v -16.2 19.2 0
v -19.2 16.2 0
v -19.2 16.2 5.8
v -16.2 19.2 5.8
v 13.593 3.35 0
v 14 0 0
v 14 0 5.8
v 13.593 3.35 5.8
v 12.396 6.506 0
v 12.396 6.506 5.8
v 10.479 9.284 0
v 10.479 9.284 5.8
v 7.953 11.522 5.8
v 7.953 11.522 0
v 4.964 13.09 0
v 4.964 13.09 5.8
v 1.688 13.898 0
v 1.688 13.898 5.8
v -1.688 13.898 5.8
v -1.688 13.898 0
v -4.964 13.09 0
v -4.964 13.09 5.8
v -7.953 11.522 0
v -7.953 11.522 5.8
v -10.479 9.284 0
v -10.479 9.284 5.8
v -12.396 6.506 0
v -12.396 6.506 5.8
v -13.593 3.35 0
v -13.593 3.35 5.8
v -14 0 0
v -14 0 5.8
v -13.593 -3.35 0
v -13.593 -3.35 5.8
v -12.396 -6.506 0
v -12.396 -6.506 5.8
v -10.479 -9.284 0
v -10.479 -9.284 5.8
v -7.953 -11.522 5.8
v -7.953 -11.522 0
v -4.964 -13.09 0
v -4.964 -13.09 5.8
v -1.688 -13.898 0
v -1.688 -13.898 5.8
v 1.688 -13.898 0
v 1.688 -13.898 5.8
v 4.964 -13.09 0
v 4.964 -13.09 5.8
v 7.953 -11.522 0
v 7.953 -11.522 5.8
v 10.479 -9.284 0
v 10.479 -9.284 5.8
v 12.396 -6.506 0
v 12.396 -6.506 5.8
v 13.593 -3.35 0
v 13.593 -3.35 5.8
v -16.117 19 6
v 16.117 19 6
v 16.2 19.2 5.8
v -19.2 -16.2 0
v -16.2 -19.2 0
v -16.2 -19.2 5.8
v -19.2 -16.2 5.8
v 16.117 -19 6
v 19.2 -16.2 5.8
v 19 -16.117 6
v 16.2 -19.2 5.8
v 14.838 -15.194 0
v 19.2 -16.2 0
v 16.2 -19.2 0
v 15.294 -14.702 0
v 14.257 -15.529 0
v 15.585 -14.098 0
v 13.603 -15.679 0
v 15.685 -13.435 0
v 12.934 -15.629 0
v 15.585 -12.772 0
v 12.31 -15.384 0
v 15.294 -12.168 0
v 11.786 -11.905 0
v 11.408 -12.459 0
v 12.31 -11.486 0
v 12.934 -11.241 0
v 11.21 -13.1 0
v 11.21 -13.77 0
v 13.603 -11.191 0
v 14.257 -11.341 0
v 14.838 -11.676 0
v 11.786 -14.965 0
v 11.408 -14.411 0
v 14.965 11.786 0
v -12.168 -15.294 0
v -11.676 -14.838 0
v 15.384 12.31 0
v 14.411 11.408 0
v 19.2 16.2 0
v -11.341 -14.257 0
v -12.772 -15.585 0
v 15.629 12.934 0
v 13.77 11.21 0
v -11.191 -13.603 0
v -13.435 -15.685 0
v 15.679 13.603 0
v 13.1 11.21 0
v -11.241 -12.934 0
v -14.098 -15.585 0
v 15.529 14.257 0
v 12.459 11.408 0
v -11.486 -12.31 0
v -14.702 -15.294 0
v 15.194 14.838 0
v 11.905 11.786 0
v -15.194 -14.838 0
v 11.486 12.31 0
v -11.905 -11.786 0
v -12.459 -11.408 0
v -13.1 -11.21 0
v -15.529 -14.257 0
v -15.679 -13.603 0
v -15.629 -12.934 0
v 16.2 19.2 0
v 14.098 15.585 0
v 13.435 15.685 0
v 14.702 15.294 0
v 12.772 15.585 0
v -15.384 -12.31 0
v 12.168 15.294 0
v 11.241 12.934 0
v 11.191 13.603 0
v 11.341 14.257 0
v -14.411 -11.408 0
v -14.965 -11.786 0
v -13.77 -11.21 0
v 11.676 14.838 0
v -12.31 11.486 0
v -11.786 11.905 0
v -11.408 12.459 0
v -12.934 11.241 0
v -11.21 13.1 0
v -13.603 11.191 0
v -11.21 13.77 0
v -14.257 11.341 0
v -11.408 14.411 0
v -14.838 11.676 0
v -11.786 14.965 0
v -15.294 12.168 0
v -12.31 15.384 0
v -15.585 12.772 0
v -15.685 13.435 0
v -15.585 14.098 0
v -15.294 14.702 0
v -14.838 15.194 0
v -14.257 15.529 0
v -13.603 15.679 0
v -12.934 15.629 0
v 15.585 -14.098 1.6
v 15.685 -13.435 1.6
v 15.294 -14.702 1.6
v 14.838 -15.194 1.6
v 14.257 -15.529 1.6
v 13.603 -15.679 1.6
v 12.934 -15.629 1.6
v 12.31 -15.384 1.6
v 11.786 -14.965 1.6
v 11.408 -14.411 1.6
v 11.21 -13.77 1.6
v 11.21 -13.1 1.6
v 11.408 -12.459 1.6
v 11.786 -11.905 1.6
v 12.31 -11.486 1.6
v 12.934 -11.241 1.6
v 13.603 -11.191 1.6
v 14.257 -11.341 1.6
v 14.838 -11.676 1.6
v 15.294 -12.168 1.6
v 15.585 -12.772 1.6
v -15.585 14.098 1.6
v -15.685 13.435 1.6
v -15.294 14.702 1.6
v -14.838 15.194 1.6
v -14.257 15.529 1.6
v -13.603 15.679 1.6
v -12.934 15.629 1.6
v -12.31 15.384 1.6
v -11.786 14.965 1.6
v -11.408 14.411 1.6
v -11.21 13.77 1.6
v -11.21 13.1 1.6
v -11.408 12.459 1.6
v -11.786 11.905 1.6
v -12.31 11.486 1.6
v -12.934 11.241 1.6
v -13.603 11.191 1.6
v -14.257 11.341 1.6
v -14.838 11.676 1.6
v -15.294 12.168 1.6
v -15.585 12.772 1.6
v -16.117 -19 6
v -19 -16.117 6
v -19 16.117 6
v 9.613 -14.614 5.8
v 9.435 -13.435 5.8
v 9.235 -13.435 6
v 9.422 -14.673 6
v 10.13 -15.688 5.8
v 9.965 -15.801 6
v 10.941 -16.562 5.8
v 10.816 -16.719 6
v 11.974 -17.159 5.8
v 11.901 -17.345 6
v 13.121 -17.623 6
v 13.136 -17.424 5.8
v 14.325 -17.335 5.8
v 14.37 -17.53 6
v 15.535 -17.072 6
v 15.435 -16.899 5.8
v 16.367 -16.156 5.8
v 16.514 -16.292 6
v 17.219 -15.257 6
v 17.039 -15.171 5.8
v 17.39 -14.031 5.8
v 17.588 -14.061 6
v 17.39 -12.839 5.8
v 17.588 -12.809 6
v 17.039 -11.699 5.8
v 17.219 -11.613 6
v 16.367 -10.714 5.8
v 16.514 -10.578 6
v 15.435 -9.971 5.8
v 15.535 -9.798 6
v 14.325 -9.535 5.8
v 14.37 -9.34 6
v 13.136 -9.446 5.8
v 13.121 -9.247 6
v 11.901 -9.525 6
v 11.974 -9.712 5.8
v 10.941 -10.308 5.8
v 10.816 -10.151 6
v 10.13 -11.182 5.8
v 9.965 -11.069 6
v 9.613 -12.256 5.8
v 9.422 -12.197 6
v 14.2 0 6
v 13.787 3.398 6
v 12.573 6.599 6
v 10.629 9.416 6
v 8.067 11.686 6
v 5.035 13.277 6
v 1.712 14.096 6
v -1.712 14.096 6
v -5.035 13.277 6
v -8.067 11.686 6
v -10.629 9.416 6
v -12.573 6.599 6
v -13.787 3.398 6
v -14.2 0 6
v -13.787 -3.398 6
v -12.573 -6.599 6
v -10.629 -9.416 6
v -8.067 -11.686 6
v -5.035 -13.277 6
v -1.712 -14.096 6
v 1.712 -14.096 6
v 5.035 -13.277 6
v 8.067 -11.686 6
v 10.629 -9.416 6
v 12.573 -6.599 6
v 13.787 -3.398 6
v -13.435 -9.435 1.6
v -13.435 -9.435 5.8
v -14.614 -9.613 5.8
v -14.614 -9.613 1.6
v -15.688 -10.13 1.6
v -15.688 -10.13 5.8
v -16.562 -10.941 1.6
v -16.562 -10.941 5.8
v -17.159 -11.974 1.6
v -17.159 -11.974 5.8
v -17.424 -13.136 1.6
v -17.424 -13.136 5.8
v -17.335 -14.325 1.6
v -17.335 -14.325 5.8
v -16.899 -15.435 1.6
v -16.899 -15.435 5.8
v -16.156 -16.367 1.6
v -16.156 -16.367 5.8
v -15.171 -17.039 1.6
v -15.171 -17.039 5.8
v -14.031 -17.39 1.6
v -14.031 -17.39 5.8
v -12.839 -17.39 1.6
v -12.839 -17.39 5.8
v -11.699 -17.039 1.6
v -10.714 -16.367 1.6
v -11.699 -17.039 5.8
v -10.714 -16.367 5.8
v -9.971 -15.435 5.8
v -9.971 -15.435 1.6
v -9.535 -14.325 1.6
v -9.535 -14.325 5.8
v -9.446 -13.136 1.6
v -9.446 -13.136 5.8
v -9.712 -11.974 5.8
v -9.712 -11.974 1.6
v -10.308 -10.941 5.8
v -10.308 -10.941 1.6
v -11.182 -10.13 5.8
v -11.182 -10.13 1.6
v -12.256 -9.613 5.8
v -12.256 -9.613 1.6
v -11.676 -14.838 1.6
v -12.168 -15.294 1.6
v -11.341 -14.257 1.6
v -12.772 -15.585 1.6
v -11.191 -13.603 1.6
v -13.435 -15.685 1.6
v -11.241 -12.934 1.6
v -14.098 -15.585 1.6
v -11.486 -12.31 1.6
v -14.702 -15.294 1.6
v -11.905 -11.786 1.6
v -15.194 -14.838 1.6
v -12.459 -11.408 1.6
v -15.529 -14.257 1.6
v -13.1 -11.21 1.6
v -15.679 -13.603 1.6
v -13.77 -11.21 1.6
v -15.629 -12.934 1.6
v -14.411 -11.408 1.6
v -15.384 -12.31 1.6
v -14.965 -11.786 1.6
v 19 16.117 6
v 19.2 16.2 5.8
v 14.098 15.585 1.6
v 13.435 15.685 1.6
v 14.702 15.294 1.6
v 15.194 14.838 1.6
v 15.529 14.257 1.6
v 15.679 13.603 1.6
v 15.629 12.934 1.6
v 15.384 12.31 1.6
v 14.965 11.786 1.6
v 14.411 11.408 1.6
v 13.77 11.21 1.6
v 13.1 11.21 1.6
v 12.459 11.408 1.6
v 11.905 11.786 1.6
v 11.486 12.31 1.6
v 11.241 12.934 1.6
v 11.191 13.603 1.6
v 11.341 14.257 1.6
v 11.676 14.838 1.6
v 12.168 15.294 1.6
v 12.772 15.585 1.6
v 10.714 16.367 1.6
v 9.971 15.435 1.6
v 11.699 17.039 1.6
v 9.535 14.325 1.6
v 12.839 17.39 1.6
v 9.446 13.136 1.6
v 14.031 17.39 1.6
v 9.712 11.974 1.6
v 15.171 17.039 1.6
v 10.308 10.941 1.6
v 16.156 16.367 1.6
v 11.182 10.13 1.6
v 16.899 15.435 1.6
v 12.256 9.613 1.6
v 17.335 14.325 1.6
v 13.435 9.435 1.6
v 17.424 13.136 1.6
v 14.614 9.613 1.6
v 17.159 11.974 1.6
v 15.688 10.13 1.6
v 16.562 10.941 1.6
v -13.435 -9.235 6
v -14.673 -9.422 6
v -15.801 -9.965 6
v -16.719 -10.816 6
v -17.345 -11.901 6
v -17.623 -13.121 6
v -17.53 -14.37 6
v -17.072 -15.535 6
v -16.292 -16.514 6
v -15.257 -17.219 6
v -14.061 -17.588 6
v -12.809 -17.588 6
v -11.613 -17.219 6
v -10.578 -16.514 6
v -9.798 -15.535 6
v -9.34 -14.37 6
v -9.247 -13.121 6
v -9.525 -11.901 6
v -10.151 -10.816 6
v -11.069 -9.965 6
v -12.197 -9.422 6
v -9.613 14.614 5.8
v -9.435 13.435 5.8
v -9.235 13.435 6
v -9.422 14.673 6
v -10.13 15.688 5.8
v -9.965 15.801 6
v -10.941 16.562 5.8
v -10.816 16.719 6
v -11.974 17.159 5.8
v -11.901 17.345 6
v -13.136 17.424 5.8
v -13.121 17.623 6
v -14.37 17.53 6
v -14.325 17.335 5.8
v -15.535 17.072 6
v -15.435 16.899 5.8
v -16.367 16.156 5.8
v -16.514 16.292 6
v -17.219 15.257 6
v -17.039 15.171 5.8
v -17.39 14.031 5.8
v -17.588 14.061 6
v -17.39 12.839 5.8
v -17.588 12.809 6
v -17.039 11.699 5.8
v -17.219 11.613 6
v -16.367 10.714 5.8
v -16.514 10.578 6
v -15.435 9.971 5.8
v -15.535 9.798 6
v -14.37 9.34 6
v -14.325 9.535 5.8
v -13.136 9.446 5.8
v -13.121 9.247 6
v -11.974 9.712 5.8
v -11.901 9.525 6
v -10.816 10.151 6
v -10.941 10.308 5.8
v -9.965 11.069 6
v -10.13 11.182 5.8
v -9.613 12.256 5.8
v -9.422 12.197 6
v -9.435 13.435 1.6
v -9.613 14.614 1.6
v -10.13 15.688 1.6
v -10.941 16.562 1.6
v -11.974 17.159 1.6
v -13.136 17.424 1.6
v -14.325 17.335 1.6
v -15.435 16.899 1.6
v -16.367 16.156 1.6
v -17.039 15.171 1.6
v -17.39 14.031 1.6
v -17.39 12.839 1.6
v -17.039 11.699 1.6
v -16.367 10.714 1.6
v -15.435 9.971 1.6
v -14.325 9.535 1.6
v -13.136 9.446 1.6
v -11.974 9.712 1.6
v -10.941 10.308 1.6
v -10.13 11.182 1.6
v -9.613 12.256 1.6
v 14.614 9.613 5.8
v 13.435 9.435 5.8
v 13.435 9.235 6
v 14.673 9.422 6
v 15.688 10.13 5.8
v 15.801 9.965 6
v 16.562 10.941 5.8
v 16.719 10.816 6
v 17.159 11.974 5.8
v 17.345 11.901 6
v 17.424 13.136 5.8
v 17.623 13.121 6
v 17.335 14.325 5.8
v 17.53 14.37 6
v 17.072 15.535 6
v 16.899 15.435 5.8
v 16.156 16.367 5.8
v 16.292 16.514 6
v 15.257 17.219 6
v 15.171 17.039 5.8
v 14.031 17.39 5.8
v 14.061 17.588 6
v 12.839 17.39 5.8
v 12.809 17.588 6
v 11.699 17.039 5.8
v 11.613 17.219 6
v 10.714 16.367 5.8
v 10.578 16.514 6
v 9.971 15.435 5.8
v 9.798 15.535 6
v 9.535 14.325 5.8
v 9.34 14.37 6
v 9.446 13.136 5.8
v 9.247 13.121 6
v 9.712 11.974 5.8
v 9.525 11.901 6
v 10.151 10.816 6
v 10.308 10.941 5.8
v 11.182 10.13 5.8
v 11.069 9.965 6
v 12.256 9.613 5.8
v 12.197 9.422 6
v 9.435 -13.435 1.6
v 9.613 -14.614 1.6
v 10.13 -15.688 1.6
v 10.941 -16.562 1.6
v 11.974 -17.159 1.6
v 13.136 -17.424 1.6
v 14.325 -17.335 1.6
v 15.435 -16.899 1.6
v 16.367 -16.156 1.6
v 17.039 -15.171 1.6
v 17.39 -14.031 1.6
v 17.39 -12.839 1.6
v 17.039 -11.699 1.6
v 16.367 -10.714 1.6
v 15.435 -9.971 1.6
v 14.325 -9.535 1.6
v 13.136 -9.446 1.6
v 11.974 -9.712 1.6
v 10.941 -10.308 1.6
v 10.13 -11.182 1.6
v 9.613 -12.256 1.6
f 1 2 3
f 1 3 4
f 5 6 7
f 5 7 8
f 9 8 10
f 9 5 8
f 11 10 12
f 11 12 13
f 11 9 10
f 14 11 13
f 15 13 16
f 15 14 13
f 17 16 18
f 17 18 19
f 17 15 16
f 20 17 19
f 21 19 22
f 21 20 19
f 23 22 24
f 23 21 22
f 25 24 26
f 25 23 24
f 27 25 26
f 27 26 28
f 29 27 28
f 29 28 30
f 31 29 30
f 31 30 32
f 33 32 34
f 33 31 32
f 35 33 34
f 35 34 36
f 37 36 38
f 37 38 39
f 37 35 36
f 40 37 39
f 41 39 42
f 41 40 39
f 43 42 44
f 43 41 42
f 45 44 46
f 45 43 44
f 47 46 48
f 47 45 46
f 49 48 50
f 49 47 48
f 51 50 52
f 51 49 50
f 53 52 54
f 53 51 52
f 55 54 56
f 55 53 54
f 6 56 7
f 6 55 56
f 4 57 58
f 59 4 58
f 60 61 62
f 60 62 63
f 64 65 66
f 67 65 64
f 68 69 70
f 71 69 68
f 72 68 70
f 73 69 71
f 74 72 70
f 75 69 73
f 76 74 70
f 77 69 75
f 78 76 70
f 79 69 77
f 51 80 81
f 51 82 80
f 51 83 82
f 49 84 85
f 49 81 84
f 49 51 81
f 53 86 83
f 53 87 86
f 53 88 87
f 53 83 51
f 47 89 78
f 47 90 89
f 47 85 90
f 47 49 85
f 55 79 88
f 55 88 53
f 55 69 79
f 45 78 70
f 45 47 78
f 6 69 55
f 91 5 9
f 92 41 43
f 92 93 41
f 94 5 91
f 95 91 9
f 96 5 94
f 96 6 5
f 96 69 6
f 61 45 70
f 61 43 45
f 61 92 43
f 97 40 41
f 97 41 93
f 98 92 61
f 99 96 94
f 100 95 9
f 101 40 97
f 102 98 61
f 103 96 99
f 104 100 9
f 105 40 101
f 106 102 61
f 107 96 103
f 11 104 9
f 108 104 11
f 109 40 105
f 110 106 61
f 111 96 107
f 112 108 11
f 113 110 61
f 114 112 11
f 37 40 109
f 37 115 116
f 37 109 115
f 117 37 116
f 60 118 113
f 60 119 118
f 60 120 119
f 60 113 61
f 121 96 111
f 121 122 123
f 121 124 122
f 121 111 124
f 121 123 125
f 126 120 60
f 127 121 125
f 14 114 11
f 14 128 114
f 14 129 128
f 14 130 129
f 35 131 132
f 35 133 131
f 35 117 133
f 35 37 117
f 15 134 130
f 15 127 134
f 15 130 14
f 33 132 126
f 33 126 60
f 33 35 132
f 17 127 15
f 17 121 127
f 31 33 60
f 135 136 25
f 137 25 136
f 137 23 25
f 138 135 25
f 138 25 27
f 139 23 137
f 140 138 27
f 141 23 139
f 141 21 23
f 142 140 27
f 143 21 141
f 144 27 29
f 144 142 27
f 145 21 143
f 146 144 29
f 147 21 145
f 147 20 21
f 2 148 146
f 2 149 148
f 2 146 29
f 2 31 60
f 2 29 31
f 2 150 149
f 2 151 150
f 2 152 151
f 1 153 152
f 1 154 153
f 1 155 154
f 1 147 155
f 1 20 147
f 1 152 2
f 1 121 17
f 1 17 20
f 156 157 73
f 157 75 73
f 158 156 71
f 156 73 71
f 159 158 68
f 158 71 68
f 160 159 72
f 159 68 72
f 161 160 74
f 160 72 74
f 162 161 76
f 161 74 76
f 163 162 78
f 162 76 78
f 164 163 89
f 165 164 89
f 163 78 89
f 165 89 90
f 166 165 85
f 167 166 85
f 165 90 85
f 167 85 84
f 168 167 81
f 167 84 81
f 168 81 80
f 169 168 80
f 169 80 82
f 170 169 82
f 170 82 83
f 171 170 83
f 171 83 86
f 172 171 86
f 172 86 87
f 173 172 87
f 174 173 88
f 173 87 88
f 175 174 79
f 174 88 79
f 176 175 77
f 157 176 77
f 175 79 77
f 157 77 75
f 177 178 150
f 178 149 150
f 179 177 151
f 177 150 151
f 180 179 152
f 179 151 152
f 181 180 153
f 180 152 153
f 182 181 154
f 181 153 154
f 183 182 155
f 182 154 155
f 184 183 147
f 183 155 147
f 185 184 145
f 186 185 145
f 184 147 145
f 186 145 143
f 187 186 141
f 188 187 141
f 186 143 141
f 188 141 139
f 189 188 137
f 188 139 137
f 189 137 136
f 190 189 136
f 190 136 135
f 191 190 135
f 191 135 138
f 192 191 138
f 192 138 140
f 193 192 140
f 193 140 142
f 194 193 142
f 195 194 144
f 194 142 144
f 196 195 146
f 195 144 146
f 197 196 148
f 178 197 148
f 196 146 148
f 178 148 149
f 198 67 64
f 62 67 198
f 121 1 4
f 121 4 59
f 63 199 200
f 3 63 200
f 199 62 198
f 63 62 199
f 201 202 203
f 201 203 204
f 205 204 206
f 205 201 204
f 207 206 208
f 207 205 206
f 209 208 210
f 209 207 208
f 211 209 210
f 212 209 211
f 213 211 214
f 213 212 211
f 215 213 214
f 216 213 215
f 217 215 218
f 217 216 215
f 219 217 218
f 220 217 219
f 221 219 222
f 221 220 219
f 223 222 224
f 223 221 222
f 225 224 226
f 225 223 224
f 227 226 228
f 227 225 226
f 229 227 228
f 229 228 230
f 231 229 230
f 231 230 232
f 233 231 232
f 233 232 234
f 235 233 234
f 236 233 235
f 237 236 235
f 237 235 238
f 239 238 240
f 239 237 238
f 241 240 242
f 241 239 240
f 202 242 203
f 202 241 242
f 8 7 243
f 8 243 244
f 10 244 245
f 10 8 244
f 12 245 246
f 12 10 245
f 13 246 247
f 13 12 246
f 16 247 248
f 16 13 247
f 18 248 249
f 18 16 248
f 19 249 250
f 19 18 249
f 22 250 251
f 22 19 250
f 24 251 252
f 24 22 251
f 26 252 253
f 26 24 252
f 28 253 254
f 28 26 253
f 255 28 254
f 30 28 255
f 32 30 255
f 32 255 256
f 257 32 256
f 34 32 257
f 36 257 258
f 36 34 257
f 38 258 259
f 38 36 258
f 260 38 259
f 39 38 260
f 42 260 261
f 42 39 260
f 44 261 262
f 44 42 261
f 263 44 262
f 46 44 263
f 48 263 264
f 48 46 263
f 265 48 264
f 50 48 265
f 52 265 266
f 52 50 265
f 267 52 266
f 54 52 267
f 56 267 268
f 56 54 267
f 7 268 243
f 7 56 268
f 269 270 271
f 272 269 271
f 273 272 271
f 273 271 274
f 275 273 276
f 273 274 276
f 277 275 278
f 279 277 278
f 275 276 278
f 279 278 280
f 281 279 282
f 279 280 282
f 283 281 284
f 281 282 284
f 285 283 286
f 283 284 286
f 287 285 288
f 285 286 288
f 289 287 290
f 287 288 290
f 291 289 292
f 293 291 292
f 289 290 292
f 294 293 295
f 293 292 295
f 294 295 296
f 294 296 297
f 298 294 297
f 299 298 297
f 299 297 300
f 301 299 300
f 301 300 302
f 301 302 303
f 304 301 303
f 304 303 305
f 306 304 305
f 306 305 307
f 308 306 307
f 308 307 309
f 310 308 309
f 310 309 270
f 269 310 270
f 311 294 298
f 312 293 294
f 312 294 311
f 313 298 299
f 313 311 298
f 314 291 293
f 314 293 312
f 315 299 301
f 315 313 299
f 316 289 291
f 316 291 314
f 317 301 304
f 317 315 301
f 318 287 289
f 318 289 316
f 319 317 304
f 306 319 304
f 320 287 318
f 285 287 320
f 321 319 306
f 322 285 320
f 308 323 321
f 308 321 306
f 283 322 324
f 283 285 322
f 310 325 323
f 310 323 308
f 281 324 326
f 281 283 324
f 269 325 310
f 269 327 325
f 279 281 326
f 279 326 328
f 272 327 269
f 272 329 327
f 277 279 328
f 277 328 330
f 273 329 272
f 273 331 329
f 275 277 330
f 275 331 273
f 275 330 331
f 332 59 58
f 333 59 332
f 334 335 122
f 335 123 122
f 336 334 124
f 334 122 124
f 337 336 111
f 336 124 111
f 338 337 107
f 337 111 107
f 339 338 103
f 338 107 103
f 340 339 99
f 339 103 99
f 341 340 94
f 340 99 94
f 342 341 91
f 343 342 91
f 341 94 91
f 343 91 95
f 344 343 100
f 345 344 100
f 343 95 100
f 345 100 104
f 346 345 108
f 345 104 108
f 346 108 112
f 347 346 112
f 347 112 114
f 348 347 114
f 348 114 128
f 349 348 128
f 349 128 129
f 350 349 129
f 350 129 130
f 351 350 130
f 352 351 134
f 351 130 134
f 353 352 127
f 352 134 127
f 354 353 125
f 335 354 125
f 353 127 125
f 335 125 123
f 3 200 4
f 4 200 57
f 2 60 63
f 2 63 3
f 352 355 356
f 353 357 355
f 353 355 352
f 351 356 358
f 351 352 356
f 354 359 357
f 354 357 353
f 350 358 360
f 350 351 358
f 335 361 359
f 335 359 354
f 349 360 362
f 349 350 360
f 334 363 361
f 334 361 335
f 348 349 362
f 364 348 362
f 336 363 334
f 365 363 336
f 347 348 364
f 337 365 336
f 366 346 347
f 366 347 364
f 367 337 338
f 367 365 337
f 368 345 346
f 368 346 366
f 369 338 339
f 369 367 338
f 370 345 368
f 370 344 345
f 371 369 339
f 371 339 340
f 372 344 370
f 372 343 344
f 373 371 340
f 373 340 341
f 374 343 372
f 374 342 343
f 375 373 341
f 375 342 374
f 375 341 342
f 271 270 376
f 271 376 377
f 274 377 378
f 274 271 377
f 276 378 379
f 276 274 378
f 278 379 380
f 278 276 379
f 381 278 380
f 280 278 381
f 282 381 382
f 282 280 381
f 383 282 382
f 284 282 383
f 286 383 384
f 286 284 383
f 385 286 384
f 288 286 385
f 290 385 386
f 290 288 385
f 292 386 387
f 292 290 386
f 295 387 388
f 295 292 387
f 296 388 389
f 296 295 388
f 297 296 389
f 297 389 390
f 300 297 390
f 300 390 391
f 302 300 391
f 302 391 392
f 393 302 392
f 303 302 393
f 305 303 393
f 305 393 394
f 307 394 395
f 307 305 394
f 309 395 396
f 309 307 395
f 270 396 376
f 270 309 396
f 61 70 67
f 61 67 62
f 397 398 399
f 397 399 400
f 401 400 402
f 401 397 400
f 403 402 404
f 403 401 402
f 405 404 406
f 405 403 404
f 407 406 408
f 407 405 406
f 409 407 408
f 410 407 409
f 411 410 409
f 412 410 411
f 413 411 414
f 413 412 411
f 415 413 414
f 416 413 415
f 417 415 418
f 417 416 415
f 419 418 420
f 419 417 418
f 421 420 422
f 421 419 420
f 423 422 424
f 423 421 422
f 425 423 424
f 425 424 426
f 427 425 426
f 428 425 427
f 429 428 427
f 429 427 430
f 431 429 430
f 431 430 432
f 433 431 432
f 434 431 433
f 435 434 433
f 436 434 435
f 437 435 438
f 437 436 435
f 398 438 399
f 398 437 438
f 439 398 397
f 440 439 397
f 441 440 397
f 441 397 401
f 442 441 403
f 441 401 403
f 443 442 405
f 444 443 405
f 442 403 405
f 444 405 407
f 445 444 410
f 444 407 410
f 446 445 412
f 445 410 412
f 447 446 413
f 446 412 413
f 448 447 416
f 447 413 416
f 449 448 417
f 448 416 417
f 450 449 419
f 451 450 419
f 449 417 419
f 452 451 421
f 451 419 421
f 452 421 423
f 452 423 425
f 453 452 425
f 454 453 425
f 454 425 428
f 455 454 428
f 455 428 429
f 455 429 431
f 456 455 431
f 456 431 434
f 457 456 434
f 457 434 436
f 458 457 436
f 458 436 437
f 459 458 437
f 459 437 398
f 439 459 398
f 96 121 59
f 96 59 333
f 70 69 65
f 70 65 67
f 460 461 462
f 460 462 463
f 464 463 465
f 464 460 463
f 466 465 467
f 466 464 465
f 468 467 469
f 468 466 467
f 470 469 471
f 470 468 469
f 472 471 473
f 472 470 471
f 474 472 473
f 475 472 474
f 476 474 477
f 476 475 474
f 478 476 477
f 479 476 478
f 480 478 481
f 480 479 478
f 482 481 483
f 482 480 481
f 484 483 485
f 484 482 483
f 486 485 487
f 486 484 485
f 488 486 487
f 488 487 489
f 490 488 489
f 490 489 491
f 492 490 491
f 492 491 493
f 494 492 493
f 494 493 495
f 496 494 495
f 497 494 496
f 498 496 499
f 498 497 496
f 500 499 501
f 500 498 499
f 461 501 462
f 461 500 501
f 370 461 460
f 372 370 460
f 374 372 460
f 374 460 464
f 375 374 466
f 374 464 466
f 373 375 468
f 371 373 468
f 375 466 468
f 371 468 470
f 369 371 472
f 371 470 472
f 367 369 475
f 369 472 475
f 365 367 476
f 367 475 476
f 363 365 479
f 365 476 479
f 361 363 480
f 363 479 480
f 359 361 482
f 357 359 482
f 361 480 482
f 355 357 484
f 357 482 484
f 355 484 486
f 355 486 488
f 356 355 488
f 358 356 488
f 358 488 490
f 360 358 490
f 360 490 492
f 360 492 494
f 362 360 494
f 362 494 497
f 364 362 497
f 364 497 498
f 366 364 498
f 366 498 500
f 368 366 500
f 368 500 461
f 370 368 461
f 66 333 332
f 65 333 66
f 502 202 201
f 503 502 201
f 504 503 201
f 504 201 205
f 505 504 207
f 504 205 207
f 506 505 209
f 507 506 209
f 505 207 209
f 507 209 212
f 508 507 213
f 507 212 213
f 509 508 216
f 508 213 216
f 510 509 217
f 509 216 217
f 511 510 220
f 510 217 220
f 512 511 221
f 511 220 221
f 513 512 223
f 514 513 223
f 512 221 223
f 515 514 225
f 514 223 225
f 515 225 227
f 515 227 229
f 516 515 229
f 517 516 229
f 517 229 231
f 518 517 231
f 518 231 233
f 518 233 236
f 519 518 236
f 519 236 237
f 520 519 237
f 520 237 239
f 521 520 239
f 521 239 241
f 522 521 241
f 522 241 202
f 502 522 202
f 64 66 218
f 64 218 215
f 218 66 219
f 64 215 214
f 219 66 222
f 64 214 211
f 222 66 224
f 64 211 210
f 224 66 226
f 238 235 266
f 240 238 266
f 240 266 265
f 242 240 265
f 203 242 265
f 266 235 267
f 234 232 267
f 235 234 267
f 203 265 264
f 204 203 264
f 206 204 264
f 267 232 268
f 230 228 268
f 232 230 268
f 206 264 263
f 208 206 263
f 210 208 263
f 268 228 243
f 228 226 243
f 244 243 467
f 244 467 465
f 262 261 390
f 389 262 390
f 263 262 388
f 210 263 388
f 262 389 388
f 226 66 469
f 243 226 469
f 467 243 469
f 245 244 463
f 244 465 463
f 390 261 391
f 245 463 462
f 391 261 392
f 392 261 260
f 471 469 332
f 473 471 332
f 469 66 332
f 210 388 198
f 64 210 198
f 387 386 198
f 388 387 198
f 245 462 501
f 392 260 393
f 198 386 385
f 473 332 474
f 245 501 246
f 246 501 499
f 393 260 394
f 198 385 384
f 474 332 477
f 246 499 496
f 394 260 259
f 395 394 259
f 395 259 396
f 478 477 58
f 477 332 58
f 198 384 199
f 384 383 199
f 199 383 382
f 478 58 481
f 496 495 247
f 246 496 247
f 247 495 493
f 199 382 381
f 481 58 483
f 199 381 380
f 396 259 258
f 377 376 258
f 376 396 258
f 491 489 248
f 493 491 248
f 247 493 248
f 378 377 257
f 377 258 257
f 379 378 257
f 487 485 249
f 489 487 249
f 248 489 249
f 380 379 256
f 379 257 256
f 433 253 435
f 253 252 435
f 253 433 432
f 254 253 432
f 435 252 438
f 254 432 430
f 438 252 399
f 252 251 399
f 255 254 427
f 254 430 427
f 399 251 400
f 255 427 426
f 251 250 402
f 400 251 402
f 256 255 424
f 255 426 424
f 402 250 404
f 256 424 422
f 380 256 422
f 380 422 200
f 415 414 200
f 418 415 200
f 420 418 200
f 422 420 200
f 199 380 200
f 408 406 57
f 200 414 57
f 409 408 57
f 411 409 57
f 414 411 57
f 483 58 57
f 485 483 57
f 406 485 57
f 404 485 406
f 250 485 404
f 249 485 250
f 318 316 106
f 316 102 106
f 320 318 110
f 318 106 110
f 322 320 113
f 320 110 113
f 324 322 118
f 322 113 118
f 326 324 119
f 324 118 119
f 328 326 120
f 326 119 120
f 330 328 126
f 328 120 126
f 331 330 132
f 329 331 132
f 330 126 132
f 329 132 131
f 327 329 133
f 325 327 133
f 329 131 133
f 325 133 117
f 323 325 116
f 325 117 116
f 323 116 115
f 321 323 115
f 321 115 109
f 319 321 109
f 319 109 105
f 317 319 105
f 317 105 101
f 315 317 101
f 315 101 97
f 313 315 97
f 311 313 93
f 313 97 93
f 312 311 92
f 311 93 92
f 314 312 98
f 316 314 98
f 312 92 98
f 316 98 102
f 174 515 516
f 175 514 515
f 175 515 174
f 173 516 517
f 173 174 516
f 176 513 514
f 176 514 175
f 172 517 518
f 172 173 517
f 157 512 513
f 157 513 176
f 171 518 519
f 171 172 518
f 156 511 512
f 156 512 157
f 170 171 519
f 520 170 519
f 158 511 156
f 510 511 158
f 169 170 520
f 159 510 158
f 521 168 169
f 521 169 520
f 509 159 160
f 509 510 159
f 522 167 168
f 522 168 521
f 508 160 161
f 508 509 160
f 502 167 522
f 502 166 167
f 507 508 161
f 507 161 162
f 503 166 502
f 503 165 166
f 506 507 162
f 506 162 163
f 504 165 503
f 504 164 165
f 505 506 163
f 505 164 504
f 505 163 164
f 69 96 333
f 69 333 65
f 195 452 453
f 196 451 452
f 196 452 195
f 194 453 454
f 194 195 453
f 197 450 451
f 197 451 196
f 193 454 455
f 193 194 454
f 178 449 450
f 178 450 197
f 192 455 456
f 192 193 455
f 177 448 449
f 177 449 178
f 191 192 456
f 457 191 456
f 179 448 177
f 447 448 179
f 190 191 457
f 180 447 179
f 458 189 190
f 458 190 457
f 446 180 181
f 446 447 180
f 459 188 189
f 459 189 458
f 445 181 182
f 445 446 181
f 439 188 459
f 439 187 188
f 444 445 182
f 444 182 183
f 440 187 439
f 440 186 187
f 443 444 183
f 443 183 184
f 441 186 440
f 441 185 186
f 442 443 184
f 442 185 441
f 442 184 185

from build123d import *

# Parameters (mm, degrees)
SKETCH_1_R                   = 14
EXTRUDE_1_DEPTH              = 6
HOLE_WIZARD_M4_3_D           = 4.5
HOLE_WIZARD_M4_3_CBORE_D     = 8
HOLE_WIZARD_M4_3_CBORE_DEPTH = 4.4
PATTERN_CIRCULAR_1_COUNT     = 4
CHAMFER_1_SIZE               = 0.2


with BuildPart() as part:
    # 草圖1 → 填料-伸長1 (new body)
    with BuildSketch(Plane.XY):
        Polygon((-19.2, 16.2), (-16.2, 19.2), (16.2, 19.2), (19.2, 16.2), (19.2, -16.2), (16.2, -19.2), (-16.2, -19.2), (-19.2, -16.2), align=None)
        Circle(SKETCH_1_R, mode=Mode.SUBTRACT)
    extrude(amount=EXTRUDE_1_DEPTH)

    # M4 六角承窩頭蓋螺釘的柱孔3 (through all)
    with Locations(Plane.XY.offset(6)):
        with Locations((-13.435028843, 13.435028843)):
            hole_wizard_m4_3 = CounterBoreHole(HOLE_WIZARD_M4_3_D / 2, HOLE_WIZARD_M4_3_CBORE_D / 2, HOLE_WIZARD_M4_3_CBORE_DEPTH)

    # 環狀複製排列1: M4 六角承窩頭蓋螺釘的柱孔3 ×4 about axis
    pattern_circular_1_axis = Axis((0, 0, 0), (0, 0, 1))
    for i in range(1, PATTERN_CIRCULAR_1_COUNT):
        add(hole_wizard_m4_3.rotate(pattern_circular_1_axis, i * 360 / PATTERN_CIRCULAR_1_COUNT), mode=Mode.SUBTRACT)

    # 導角1
    chamfer_1_edges = [part.edges().sort_by_distance(p)[0] for p in [
        (0, -19.2, 6),
        (17.7, -17.7, 6),
        (19.2, 0, 6),
        (17.7, 17.7, 6),
        (-14, 0, 6),
        (0, 19.2, 6),
        (-17.7, 17.7, 6),
        (-17.435028843, 13.435028843, 6),
        (-13.435028843, -17.435028843, 6),
        (-19.2, 0, 6),
        (17.435028843, -13.435028843, 6),
        (13.435028843, 17.435028843, 6),
        (-17.7, -17.7, 6),
    ]]
    chamfer(chamfer_1_edges, length=CHAMFER_1_SIZE)


solid = part.part
